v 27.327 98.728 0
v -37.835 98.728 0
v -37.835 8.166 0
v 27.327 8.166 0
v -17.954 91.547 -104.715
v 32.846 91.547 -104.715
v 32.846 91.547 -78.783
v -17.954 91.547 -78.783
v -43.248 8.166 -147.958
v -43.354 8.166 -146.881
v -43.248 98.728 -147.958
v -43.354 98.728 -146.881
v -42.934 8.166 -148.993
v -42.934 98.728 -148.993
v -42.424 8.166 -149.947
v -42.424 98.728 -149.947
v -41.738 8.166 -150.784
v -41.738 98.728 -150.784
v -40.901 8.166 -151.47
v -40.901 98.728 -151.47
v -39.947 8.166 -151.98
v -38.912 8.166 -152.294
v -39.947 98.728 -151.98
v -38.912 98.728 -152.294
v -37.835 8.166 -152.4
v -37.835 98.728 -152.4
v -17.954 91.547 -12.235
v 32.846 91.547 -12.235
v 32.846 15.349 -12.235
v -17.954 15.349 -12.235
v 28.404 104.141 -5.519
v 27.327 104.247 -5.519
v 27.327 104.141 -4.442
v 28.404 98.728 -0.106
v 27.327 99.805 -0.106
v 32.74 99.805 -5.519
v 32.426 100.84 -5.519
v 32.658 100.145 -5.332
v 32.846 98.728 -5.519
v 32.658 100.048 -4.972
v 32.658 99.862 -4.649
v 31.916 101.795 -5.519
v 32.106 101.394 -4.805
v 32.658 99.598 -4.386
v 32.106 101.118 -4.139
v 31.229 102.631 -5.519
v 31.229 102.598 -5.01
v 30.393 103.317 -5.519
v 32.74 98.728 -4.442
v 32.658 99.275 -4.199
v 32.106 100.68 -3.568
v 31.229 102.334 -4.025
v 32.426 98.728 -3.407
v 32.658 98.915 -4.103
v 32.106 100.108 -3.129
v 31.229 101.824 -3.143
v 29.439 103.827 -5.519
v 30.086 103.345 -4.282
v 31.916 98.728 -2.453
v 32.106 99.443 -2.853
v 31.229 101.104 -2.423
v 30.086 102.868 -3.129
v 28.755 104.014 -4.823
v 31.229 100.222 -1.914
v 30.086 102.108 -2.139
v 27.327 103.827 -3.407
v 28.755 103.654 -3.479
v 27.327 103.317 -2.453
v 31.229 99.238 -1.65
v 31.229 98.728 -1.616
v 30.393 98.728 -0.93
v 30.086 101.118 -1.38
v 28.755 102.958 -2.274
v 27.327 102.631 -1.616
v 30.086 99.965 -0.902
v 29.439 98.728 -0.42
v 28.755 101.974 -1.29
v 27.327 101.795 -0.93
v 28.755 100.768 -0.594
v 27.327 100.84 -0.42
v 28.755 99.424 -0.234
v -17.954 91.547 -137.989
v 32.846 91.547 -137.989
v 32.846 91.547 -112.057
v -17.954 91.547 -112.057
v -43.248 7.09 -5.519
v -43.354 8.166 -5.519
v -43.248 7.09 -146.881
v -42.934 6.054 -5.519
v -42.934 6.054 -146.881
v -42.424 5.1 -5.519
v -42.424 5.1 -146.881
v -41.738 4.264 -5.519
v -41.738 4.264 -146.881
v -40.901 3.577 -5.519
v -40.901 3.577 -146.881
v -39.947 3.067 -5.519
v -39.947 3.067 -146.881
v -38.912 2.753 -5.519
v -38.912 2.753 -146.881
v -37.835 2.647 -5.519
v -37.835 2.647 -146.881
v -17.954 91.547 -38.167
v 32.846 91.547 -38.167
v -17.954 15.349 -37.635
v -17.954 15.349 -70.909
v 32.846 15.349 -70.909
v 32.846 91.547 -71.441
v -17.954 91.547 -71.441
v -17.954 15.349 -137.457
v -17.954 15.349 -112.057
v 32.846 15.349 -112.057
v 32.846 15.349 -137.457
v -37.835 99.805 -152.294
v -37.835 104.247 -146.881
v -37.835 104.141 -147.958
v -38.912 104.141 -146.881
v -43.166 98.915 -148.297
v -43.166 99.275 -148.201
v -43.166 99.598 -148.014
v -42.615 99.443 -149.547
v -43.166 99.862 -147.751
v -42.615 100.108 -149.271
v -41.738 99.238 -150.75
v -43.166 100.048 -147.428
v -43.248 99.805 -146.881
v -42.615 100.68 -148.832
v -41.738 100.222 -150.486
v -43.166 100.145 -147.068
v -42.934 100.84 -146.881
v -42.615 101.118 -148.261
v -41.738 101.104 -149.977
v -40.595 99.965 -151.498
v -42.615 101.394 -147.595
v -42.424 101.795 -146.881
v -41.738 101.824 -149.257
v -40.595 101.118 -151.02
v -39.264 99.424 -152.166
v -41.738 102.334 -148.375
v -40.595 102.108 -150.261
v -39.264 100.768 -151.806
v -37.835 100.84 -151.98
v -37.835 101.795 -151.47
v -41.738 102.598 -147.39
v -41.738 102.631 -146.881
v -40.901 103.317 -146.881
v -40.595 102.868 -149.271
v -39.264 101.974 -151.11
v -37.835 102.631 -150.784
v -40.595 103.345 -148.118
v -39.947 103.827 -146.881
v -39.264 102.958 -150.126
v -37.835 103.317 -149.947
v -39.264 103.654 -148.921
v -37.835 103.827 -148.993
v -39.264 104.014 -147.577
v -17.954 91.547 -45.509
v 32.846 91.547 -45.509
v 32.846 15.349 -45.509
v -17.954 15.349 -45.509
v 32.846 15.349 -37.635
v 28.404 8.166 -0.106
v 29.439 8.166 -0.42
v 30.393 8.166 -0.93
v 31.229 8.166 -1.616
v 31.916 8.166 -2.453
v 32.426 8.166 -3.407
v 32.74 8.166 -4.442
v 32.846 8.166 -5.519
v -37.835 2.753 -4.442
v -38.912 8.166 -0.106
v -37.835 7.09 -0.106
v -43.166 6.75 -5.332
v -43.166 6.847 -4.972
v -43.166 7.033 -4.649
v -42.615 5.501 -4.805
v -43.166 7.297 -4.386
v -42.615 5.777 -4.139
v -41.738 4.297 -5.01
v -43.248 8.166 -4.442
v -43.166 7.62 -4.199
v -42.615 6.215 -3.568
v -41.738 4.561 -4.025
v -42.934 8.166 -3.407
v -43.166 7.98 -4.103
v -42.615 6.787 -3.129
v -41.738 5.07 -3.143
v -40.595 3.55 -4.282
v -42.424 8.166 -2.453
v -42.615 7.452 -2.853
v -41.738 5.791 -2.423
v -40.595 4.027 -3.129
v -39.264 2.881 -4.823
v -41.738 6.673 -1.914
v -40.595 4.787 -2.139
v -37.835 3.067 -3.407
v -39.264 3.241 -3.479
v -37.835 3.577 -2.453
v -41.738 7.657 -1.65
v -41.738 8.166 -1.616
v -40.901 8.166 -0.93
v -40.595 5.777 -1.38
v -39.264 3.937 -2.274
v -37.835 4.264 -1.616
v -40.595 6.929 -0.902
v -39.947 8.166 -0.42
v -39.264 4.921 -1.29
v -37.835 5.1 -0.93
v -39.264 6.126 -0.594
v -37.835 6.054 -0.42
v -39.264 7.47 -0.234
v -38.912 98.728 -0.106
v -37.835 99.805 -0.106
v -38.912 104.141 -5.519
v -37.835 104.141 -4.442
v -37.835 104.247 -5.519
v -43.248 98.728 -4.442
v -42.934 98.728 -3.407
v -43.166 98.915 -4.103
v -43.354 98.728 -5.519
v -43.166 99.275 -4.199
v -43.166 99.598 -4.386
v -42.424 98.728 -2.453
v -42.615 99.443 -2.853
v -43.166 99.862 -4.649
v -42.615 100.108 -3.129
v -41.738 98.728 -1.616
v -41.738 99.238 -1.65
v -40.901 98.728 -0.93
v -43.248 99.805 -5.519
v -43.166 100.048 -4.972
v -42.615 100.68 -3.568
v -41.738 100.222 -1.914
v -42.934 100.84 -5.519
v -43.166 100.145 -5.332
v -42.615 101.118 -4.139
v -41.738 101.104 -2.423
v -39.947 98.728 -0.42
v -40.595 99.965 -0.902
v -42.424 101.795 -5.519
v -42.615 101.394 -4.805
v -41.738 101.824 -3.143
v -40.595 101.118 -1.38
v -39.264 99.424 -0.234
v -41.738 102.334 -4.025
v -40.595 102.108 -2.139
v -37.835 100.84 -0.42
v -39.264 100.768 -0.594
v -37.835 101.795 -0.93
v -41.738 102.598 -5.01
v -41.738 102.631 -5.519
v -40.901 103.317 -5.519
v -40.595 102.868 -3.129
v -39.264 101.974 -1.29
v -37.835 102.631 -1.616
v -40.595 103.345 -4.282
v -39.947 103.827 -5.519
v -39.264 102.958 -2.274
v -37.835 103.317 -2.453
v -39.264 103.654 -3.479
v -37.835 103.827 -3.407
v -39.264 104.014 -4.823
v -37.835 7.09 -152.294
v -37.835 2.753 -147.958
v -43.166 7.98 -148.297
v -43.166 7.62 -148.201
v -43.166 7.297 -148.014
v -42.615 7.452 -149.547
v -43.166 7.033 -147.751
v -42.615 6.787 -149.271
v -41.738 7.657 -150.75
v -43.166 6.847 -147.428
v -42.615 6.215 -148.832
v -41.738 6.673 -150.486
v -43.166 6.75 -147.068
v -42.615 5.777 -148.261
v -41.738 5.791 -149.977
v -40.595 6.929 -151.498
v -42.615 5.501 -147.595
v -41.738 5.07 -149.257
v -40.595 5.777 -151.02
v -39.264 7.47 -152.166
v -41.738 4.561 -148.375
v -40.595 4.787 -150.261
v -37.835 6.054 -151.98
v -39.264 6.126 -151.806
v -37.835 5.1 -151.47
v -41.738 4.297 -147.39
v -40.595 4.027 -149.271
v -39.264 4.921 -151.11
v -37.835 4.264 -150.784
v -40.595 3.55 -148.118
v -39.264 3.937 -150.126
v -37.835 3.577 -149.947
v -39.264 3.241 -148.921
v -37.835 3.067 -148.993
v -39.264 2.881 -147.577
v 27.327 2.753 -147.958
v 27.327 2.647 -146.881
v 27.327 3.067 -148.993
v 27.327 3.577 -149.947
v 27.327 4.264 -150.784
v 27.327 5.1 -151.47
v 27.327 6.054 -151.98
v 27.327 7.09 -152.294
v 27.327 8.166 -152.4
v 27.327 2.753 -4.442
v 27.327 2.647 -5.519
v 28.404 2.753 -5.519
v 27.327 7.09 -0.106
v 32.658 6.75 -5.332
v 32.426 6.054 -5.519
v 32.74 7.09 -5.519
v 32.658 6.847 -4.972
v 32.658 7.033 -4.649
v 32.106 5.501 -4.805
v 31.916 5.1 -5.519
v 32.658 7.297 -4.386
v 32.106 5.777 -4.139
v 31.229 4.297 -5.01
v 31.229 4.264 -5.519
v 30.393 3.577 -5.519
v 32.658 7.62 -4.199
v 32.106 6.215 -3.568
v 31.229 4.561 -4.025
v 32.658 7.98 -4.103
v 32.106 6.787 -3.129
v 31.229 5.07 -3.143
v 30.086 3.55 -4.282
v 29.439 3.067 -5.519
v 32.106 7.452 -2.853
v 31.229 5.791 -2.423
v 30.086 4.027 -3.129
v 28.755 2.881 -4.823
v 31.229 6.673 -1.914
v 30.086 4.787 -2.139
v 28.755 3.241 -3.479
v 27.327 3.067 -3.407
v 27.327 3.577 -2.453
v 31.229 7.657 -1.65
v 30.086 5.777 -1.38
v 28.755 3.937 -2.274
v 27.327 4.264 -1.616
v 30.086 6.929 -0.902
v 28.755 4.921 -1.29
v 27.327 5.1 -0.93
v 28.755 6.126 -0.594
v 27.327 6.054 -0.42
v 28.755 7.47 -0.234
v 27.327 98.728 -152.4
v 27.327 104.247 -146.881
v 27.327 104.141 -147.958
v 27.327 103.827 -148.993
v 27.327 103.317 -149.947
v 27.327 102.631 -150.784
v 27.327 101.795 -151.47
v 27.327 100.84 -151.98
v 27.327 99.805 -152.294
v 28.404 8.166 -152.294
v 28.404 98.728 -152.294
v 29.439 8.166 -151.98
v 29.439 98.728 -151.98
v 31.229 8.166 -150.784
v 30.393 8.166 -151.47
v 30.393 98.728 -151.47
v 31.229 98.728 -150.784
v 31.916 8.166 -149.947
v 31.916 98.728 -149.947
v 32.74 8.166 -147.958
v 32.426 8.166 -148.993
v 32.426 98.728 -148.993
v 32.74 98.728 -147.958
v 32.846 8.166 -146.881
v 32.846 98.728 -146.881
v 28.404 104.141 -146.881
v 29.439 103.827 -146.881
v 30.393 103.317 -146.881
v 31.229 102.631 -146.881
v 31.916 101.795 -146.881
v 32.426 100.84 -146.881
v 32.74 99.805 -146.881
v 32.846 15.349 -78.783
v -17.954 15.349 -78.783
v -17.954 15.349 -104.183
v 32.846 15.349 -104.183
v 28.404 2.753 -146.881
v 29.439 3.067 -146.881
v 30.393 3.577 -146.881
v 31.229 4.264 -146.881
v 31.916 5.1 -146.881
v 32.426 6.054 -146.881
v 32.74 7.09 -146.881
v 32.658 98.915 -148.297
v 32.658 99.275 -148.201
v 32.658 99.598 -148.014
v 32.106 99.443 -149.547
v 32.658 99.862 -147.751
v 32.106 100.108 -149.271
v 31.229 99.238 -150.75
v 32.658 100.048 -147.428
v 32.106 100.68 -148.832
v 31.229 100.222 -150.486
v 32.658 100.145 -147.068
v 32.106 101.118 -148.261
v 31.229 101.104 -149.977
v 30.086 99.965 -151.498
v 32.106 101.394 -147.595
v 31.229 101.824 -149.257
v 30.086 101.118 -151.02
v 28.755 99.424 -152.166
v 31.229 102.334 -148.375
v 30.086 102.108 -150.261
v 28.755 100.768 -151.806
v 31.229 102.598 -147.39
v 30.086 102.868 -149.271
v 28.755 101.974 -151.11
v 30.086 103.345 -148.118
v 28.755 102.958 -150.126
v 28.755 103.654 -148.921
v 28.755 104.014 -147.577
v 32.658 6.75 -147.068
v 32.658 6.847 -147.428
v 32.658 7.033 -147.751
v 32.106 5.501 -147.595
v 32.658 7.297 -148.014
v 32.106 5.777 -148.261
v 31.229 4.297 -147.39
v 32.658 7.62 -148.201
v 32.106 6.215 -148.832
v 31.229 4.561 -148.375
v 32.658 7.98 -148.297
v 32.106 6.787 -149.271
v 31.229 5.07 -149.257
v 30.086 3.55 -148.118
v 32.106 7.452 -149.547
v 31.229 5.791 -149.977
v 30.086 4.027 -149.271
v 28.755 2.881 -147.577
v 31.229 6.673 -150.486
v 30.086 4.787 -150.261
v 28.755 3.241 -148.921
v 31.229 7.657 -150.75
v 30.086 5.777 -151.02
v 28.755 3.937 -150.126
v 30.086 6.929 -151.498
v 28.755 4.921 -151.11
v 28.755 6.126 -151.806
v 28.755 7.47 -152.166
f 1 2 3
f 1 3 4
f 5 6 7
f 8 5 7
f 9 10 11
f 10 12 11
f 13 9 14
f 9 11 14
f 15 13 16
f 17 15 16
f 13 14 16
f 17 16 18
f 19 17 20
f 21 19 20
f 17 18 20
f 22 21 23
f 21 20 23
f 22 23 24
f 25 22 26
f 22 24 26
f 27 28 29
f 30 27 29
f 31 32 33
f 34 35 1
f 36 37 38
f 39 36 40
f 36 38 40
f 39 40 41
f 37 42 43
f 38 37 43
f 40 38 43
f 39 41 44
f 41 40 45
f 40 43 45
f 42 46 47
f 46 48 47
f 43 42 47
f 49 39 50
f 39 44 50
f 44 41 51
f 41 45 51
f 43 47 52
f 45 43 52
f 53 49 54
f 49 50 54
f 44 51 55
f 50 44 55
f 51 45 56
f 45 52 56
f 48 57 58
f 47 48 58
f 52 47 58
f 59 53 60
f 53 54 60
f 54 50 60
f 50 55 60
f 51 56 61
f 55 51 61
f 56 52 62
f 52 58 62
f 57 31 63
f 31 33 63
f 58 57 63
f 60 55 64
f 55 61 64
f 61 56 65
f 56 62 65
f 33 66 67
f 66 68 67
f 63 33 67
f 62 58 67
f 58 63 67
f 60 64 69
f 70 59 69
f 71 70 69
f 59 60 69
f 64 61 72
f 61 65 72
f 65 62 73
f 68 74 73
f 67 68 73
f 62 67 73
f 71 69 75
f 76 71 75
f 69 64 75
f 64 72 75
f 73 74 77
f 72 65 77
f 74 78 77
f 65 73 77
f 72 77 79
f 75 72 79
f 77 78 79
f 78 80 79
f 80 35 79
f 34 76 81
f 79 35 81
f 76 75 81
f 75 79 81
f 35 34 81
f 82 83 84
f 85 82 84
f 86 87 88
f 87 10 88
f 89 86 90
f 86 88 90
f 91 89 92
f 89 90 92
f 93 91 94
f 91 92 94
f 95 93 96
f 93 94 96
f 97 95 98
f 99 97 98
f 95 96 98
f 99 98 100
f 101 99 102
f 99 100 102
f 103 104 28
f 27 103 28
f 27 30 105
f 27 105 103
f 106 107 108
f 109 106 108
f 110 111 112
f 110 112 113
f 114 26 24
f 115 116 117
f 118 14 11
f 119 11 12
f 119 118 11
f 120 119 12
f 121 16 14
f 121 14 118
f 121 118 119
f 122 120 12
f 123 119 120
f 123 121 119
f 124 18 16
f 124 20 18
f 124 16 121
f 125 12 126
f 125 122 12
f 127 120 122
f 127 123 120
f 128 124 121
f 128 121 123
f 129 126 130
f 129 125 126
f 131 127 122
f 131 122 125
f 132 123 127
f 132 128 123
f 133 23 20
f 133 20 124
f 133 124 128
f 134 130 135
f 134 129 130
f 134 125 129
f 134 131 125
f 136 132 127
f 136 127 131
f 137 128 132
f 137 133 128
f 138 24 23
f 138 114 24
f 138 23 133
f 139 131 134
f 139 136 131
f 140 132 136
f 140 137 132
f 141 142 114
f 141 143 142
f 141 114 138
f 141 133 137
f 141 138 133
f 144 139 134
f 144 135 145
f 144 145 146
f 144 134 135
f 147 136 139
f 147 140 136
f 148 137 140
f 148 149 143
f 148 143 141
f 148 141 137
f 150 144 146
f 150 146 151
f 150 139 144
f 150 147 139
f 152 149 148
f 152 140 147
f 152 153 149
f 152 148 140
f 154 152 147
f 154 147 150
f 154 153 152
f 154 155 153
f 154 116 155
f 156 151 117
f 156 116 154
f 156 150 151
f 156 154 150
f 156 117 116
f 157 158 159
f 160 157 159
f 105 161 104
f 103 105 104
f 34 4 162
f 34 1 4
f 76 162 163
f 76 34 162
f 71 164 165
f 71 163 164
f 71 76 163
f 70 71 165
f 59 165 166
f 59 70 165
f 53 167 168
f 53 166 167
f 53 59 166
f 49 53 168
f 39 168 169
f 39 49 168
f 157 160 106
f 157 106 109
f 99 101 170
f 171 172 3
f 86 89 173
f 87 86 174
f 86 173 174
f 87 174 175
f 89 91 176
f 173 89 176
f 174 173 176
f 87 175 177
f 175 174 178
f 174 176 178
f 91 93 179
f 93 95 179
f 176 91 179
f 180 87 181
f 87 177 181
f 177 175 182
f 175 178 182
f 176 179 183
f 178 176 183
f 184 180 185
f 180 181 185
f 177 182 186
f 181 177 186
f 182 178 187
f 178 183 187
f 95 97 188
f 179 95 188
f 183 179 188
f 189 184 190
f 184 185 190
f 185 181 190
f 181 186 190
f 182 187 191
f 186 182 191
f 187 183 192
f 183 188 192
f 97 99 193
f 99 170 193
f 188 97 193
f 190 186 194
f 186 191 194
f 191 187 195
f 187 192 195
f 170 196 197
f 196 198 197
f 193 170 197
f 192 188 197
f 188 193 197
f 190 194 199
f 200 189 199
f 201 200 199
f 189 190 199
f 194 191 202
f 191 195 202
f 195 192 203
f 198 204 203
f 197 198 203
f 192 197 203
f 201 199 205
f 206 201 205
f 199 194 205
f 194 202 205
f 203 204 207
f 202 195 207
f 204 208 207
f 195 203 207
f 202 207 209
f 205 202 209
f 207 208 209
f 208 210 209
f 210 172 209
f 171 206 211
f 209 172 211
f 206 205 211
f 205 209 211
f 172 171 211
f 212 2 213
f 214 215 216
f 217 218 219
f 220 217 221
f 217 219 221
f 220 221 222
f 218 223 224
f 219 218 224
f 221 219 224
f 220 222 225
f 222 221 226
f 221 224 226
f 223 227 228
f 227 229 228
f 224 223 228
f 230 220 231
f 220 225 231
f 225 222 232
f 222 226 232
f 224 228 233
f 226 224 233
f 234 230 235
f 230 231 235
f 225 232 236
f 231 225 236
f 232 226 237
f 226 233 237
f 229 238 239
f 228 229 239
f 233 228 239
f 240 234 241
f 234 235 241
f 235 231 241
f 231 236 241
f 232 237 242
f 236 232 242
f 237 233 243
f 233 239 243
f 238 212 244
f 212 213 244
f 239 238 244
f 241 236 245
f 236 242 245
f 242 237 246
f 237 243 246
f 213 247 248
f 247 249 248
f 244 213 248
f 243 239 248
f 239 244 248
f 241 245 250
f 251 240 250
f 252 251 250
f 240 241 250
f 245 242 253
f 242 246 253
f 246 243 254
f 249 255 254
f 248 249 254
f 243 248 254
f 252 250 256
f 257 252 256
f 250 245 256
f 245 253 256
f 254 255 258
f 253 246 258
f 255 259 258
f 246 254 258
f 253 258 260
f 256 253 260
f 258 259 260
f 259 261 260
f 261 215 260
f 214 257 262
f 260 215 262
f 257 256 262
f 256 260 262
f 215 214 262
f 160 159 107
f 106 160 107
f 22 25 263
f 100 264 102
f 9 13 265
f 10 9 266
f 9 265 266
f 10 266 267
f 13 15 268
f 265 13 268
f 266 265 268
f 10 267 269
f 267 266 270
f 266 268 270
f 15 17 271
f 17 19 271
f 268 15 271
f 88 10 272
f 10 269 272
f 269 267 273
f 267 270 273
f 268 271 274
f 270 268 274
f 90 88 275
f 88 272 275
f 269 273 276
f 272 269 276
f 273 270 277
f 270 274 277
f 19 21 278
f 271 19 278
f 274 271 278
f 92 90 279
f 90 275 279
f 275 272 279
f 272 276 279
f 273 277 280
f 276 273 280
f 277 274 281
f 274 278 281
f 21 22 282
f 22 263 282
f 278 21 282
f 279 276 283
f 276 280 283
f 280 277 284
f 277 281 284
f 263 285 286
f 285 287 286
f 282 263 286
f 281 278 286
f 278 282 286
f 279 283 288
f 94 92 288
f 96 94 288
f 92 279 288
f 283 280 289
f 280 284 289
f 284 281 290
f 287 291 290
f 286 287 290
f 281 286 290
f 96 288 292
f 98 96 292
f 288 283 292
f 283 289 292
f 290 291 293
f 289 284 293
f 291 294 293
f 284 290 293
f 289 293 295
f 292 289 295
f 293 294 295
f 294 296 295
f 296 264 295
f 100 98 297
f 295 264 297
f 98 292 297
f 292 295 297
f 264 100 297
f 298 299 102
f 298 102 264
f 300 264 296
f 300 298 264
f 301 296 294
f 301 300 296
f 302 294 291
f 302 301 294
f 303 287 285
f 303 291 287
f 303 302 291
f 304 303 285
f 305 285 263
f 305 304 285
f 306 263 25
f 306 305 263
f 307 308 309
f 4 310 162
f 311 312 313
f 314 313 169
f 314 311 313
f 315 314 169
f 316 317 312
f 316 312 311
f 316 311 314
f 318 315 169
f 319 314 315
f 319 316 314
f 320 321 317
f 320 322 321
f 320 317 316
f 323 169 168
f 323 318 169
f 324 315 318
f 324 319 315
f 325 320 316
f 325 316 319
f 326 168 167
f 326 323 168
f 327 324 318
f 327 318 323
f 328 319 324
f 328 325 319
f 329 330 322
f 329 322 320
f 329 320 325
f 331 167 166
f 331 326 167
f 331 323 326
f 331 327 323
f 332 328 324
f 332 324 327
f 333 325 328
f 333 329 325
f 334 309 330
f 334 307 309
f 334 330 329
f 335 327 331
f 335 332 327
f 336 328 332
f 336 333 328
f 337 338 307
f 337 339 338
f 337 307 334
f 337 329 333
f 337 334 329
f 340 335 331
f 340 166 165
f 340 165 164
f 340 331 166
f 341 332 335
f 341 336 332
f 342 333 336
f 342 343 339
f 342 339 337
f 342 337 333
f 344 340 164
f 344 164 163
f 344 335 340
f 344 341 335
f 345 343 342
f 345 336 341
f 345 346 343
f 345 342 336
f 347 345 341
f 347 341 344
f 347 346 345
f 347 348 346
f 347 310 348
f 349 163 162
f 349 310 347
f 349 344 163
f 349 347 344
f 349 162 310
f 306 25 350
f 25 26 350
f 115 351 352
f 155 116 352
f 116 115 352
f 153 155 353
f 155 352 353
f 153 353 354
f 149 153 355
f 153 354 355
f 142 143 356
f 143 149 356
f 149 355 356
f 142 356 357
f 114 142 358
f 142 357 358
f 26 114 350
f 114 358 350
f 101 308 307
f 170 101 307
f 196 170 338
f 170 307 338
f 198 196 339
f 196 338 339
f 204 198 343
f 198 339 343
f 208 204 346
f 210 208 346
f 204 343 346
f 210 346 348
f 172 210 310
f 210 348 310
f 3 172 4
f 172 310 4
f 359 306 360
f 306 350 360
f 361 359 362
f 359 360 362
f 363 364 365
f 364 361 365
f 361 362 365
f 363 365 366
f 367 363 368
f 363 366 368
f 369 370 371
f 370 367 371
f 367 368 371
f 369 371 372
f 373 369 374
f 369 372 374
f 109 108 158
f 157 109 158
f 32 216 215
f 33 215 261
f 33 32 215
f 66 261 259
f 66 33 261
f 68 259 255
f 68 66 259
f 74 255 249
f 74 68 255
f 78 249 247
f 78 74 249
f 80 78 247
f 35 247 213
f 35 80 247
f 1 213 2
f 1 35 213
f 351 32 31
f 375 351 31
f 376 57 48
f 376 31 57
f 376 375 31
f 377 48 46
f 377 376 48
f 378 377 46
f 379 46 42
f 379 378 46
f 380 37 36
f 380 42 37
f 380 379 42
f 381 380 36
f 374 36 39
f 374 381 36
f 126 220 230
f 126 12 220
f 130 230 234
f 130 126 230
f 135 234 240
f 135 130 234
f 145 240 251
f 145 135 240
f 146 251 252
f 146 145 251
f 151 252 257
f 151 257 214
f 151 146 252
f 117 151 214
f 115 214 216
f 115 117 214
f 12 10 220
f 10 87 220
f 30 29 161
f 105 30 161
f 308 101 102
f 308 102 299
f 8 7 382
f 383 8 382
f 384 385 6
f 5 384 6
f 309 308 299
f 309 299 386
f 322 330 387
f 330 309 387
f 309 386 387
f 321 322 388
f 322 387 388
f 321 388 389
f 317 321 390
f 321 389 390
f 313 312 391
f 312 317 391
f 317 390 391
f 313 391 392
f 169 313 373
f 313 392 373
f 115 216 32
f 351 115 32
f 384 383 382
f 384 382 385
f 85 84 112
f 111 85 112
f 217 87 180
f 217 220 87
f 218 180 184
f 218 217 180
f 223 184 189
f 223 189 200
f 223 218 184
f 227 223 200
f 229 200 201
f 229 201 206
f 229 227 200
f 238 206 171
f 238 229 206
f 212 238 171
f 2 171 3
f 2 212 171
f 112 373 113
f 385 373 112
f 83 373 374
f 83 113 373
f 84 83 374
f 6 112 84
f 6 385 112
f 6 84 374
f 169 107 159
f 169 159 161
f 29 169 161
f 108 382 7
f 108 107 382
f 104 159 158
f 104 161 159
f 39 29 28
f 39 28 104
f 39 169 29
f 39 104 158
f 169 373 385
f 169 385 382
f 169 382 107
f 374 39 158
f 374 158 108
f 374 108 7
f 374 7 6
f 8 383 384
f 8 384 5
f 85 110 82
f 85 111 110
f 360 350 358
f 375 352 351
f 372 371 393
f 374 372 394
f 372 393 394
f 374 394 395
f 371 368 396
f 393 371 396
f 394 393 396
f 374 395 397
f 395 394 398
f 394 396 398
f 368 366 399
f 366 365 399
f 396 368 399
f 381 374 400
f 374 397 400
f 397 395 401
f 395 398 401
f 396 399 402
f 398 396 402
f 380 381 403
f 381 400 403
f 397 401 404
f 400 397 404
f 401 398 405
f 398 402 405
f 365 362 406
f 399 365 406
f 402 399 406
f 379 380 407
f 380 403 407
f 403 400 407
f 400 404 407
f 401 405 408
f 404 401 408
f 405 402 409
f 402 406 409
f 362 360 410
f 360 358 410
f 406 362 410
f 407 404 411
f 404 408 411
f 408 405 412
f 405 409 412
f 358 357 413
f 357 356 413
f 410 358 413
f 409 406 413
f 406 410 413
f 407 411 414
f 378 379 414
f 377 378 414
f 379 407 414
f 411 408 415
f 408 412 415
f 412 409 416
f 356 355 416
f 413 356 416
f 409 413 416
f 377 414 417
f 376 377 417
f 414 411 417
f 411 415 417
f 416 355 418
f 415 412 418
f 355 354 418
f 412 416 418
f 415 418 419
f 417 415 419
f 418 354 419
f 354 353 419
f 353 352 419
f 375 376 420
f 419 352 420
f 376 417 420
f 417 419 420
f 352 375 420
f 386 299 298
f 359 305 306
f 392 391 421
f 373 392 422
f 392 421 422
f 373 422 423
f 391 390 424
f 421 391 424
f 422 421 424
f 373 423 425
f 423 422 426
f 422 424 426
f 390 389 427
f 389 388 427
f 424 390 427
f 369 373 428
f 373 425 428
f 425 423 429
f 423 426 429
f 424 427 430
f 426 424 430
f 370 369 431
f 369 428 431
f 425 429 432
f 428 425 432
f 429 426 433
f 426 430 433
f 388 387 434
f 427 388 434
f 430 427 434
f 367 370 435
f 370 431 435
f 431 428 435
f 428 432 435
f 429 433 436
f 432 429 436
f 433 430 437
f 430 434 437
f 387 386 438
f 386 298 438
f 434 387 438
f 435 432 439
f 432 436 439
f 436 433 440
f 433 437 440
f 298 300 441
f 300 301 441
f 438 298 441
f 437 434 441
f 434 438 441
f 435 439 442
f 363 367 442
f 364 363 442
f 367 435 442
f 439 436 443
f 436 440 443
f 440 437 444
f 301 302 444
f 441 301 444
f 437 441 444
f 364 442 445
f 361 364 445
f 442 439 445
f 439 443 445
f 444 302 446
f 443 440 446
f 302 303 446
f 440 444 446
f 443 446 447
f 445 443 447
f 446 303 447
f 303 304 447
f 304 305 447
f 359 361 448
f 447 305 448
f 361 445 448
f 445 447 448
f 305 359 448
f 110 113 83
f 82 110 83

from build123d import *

# Parameters (mm, degrees)
F0_W     = 76.2
F0_H     = 101.6
F1_DEPTH = 152.4
F3_DEPTH = 50.8
F4_R     = 5.5188922036


# Not quite as in the source:
# - a feature names something its author has since deleted; it is built from what else it names


with BuildPart() as f1:
    # F0 (on Top) → F1 (new body)
    with BuildSketch(Plane.XY):
        with Locations((-5.2541131154, 53.4473587833)):
            Rectangle(F0_W, F0_H)
    extrude(amount=-F1_DEPTH)

    # F2 (on face) → F3 (cut)
    with BuildSketch(Plane.YZ.offset(32.8458868846)):
        Polygon((15.3492157235, -137.4566919493), (91.5473587833, -137.988663984), (91.5473587833, -112.0566919493), (15.3492157235, -112.0566919493), align=None)
        Polygon((15.3492157235, -78.7826919493), (15.3492157235, -104.1826919493), (91.5473587833, -104.714663984), (91.5473587833, -78.7826919493), align=None)
        Polygon((15.3492157235, -45.5086919493), (15.3492157235, -70.9086919493), (91.5473587833, -71.440663984), (91.5473587833, -45.5086919493), align=None)
        Polygon((15.3492157235, -12.2346919493), (15.3492157235, -37.6346919493), (91.5473587833, -38.166663984), (91.5473587833, -12.2346919493), align=None)
    extrude(amount=-F3_DEPTH, mode=Mode.SUBTRACT)

    # F4
    f4_edges = [f1.edges().sort_by_distance(p)[0] for p in [
        (-5.254113, 104.247359, 0),
        (-5.254113, 2.647359, 0),
        (-5.254113, 2.647359, -152.4),
        (-5.254113, 104.247359, -152.4),
        (32.845887, 2.647359, -76.2),
        (32.845887, 53.447359, -152.4),
        (32.845887, 104.247359, -76.2),
        (-43.354113, 53.447359, -152.4),
        (-43.354113, 2.647359, -76.2),
        (32.845887, 53.447359, 0),
        (-43.354113, 53.447359, 0),
        (-43.354113, 104.247359, -76.2),
    ]]
    fillet(f4_edges, radius=F4_R)


solid = f1.part
